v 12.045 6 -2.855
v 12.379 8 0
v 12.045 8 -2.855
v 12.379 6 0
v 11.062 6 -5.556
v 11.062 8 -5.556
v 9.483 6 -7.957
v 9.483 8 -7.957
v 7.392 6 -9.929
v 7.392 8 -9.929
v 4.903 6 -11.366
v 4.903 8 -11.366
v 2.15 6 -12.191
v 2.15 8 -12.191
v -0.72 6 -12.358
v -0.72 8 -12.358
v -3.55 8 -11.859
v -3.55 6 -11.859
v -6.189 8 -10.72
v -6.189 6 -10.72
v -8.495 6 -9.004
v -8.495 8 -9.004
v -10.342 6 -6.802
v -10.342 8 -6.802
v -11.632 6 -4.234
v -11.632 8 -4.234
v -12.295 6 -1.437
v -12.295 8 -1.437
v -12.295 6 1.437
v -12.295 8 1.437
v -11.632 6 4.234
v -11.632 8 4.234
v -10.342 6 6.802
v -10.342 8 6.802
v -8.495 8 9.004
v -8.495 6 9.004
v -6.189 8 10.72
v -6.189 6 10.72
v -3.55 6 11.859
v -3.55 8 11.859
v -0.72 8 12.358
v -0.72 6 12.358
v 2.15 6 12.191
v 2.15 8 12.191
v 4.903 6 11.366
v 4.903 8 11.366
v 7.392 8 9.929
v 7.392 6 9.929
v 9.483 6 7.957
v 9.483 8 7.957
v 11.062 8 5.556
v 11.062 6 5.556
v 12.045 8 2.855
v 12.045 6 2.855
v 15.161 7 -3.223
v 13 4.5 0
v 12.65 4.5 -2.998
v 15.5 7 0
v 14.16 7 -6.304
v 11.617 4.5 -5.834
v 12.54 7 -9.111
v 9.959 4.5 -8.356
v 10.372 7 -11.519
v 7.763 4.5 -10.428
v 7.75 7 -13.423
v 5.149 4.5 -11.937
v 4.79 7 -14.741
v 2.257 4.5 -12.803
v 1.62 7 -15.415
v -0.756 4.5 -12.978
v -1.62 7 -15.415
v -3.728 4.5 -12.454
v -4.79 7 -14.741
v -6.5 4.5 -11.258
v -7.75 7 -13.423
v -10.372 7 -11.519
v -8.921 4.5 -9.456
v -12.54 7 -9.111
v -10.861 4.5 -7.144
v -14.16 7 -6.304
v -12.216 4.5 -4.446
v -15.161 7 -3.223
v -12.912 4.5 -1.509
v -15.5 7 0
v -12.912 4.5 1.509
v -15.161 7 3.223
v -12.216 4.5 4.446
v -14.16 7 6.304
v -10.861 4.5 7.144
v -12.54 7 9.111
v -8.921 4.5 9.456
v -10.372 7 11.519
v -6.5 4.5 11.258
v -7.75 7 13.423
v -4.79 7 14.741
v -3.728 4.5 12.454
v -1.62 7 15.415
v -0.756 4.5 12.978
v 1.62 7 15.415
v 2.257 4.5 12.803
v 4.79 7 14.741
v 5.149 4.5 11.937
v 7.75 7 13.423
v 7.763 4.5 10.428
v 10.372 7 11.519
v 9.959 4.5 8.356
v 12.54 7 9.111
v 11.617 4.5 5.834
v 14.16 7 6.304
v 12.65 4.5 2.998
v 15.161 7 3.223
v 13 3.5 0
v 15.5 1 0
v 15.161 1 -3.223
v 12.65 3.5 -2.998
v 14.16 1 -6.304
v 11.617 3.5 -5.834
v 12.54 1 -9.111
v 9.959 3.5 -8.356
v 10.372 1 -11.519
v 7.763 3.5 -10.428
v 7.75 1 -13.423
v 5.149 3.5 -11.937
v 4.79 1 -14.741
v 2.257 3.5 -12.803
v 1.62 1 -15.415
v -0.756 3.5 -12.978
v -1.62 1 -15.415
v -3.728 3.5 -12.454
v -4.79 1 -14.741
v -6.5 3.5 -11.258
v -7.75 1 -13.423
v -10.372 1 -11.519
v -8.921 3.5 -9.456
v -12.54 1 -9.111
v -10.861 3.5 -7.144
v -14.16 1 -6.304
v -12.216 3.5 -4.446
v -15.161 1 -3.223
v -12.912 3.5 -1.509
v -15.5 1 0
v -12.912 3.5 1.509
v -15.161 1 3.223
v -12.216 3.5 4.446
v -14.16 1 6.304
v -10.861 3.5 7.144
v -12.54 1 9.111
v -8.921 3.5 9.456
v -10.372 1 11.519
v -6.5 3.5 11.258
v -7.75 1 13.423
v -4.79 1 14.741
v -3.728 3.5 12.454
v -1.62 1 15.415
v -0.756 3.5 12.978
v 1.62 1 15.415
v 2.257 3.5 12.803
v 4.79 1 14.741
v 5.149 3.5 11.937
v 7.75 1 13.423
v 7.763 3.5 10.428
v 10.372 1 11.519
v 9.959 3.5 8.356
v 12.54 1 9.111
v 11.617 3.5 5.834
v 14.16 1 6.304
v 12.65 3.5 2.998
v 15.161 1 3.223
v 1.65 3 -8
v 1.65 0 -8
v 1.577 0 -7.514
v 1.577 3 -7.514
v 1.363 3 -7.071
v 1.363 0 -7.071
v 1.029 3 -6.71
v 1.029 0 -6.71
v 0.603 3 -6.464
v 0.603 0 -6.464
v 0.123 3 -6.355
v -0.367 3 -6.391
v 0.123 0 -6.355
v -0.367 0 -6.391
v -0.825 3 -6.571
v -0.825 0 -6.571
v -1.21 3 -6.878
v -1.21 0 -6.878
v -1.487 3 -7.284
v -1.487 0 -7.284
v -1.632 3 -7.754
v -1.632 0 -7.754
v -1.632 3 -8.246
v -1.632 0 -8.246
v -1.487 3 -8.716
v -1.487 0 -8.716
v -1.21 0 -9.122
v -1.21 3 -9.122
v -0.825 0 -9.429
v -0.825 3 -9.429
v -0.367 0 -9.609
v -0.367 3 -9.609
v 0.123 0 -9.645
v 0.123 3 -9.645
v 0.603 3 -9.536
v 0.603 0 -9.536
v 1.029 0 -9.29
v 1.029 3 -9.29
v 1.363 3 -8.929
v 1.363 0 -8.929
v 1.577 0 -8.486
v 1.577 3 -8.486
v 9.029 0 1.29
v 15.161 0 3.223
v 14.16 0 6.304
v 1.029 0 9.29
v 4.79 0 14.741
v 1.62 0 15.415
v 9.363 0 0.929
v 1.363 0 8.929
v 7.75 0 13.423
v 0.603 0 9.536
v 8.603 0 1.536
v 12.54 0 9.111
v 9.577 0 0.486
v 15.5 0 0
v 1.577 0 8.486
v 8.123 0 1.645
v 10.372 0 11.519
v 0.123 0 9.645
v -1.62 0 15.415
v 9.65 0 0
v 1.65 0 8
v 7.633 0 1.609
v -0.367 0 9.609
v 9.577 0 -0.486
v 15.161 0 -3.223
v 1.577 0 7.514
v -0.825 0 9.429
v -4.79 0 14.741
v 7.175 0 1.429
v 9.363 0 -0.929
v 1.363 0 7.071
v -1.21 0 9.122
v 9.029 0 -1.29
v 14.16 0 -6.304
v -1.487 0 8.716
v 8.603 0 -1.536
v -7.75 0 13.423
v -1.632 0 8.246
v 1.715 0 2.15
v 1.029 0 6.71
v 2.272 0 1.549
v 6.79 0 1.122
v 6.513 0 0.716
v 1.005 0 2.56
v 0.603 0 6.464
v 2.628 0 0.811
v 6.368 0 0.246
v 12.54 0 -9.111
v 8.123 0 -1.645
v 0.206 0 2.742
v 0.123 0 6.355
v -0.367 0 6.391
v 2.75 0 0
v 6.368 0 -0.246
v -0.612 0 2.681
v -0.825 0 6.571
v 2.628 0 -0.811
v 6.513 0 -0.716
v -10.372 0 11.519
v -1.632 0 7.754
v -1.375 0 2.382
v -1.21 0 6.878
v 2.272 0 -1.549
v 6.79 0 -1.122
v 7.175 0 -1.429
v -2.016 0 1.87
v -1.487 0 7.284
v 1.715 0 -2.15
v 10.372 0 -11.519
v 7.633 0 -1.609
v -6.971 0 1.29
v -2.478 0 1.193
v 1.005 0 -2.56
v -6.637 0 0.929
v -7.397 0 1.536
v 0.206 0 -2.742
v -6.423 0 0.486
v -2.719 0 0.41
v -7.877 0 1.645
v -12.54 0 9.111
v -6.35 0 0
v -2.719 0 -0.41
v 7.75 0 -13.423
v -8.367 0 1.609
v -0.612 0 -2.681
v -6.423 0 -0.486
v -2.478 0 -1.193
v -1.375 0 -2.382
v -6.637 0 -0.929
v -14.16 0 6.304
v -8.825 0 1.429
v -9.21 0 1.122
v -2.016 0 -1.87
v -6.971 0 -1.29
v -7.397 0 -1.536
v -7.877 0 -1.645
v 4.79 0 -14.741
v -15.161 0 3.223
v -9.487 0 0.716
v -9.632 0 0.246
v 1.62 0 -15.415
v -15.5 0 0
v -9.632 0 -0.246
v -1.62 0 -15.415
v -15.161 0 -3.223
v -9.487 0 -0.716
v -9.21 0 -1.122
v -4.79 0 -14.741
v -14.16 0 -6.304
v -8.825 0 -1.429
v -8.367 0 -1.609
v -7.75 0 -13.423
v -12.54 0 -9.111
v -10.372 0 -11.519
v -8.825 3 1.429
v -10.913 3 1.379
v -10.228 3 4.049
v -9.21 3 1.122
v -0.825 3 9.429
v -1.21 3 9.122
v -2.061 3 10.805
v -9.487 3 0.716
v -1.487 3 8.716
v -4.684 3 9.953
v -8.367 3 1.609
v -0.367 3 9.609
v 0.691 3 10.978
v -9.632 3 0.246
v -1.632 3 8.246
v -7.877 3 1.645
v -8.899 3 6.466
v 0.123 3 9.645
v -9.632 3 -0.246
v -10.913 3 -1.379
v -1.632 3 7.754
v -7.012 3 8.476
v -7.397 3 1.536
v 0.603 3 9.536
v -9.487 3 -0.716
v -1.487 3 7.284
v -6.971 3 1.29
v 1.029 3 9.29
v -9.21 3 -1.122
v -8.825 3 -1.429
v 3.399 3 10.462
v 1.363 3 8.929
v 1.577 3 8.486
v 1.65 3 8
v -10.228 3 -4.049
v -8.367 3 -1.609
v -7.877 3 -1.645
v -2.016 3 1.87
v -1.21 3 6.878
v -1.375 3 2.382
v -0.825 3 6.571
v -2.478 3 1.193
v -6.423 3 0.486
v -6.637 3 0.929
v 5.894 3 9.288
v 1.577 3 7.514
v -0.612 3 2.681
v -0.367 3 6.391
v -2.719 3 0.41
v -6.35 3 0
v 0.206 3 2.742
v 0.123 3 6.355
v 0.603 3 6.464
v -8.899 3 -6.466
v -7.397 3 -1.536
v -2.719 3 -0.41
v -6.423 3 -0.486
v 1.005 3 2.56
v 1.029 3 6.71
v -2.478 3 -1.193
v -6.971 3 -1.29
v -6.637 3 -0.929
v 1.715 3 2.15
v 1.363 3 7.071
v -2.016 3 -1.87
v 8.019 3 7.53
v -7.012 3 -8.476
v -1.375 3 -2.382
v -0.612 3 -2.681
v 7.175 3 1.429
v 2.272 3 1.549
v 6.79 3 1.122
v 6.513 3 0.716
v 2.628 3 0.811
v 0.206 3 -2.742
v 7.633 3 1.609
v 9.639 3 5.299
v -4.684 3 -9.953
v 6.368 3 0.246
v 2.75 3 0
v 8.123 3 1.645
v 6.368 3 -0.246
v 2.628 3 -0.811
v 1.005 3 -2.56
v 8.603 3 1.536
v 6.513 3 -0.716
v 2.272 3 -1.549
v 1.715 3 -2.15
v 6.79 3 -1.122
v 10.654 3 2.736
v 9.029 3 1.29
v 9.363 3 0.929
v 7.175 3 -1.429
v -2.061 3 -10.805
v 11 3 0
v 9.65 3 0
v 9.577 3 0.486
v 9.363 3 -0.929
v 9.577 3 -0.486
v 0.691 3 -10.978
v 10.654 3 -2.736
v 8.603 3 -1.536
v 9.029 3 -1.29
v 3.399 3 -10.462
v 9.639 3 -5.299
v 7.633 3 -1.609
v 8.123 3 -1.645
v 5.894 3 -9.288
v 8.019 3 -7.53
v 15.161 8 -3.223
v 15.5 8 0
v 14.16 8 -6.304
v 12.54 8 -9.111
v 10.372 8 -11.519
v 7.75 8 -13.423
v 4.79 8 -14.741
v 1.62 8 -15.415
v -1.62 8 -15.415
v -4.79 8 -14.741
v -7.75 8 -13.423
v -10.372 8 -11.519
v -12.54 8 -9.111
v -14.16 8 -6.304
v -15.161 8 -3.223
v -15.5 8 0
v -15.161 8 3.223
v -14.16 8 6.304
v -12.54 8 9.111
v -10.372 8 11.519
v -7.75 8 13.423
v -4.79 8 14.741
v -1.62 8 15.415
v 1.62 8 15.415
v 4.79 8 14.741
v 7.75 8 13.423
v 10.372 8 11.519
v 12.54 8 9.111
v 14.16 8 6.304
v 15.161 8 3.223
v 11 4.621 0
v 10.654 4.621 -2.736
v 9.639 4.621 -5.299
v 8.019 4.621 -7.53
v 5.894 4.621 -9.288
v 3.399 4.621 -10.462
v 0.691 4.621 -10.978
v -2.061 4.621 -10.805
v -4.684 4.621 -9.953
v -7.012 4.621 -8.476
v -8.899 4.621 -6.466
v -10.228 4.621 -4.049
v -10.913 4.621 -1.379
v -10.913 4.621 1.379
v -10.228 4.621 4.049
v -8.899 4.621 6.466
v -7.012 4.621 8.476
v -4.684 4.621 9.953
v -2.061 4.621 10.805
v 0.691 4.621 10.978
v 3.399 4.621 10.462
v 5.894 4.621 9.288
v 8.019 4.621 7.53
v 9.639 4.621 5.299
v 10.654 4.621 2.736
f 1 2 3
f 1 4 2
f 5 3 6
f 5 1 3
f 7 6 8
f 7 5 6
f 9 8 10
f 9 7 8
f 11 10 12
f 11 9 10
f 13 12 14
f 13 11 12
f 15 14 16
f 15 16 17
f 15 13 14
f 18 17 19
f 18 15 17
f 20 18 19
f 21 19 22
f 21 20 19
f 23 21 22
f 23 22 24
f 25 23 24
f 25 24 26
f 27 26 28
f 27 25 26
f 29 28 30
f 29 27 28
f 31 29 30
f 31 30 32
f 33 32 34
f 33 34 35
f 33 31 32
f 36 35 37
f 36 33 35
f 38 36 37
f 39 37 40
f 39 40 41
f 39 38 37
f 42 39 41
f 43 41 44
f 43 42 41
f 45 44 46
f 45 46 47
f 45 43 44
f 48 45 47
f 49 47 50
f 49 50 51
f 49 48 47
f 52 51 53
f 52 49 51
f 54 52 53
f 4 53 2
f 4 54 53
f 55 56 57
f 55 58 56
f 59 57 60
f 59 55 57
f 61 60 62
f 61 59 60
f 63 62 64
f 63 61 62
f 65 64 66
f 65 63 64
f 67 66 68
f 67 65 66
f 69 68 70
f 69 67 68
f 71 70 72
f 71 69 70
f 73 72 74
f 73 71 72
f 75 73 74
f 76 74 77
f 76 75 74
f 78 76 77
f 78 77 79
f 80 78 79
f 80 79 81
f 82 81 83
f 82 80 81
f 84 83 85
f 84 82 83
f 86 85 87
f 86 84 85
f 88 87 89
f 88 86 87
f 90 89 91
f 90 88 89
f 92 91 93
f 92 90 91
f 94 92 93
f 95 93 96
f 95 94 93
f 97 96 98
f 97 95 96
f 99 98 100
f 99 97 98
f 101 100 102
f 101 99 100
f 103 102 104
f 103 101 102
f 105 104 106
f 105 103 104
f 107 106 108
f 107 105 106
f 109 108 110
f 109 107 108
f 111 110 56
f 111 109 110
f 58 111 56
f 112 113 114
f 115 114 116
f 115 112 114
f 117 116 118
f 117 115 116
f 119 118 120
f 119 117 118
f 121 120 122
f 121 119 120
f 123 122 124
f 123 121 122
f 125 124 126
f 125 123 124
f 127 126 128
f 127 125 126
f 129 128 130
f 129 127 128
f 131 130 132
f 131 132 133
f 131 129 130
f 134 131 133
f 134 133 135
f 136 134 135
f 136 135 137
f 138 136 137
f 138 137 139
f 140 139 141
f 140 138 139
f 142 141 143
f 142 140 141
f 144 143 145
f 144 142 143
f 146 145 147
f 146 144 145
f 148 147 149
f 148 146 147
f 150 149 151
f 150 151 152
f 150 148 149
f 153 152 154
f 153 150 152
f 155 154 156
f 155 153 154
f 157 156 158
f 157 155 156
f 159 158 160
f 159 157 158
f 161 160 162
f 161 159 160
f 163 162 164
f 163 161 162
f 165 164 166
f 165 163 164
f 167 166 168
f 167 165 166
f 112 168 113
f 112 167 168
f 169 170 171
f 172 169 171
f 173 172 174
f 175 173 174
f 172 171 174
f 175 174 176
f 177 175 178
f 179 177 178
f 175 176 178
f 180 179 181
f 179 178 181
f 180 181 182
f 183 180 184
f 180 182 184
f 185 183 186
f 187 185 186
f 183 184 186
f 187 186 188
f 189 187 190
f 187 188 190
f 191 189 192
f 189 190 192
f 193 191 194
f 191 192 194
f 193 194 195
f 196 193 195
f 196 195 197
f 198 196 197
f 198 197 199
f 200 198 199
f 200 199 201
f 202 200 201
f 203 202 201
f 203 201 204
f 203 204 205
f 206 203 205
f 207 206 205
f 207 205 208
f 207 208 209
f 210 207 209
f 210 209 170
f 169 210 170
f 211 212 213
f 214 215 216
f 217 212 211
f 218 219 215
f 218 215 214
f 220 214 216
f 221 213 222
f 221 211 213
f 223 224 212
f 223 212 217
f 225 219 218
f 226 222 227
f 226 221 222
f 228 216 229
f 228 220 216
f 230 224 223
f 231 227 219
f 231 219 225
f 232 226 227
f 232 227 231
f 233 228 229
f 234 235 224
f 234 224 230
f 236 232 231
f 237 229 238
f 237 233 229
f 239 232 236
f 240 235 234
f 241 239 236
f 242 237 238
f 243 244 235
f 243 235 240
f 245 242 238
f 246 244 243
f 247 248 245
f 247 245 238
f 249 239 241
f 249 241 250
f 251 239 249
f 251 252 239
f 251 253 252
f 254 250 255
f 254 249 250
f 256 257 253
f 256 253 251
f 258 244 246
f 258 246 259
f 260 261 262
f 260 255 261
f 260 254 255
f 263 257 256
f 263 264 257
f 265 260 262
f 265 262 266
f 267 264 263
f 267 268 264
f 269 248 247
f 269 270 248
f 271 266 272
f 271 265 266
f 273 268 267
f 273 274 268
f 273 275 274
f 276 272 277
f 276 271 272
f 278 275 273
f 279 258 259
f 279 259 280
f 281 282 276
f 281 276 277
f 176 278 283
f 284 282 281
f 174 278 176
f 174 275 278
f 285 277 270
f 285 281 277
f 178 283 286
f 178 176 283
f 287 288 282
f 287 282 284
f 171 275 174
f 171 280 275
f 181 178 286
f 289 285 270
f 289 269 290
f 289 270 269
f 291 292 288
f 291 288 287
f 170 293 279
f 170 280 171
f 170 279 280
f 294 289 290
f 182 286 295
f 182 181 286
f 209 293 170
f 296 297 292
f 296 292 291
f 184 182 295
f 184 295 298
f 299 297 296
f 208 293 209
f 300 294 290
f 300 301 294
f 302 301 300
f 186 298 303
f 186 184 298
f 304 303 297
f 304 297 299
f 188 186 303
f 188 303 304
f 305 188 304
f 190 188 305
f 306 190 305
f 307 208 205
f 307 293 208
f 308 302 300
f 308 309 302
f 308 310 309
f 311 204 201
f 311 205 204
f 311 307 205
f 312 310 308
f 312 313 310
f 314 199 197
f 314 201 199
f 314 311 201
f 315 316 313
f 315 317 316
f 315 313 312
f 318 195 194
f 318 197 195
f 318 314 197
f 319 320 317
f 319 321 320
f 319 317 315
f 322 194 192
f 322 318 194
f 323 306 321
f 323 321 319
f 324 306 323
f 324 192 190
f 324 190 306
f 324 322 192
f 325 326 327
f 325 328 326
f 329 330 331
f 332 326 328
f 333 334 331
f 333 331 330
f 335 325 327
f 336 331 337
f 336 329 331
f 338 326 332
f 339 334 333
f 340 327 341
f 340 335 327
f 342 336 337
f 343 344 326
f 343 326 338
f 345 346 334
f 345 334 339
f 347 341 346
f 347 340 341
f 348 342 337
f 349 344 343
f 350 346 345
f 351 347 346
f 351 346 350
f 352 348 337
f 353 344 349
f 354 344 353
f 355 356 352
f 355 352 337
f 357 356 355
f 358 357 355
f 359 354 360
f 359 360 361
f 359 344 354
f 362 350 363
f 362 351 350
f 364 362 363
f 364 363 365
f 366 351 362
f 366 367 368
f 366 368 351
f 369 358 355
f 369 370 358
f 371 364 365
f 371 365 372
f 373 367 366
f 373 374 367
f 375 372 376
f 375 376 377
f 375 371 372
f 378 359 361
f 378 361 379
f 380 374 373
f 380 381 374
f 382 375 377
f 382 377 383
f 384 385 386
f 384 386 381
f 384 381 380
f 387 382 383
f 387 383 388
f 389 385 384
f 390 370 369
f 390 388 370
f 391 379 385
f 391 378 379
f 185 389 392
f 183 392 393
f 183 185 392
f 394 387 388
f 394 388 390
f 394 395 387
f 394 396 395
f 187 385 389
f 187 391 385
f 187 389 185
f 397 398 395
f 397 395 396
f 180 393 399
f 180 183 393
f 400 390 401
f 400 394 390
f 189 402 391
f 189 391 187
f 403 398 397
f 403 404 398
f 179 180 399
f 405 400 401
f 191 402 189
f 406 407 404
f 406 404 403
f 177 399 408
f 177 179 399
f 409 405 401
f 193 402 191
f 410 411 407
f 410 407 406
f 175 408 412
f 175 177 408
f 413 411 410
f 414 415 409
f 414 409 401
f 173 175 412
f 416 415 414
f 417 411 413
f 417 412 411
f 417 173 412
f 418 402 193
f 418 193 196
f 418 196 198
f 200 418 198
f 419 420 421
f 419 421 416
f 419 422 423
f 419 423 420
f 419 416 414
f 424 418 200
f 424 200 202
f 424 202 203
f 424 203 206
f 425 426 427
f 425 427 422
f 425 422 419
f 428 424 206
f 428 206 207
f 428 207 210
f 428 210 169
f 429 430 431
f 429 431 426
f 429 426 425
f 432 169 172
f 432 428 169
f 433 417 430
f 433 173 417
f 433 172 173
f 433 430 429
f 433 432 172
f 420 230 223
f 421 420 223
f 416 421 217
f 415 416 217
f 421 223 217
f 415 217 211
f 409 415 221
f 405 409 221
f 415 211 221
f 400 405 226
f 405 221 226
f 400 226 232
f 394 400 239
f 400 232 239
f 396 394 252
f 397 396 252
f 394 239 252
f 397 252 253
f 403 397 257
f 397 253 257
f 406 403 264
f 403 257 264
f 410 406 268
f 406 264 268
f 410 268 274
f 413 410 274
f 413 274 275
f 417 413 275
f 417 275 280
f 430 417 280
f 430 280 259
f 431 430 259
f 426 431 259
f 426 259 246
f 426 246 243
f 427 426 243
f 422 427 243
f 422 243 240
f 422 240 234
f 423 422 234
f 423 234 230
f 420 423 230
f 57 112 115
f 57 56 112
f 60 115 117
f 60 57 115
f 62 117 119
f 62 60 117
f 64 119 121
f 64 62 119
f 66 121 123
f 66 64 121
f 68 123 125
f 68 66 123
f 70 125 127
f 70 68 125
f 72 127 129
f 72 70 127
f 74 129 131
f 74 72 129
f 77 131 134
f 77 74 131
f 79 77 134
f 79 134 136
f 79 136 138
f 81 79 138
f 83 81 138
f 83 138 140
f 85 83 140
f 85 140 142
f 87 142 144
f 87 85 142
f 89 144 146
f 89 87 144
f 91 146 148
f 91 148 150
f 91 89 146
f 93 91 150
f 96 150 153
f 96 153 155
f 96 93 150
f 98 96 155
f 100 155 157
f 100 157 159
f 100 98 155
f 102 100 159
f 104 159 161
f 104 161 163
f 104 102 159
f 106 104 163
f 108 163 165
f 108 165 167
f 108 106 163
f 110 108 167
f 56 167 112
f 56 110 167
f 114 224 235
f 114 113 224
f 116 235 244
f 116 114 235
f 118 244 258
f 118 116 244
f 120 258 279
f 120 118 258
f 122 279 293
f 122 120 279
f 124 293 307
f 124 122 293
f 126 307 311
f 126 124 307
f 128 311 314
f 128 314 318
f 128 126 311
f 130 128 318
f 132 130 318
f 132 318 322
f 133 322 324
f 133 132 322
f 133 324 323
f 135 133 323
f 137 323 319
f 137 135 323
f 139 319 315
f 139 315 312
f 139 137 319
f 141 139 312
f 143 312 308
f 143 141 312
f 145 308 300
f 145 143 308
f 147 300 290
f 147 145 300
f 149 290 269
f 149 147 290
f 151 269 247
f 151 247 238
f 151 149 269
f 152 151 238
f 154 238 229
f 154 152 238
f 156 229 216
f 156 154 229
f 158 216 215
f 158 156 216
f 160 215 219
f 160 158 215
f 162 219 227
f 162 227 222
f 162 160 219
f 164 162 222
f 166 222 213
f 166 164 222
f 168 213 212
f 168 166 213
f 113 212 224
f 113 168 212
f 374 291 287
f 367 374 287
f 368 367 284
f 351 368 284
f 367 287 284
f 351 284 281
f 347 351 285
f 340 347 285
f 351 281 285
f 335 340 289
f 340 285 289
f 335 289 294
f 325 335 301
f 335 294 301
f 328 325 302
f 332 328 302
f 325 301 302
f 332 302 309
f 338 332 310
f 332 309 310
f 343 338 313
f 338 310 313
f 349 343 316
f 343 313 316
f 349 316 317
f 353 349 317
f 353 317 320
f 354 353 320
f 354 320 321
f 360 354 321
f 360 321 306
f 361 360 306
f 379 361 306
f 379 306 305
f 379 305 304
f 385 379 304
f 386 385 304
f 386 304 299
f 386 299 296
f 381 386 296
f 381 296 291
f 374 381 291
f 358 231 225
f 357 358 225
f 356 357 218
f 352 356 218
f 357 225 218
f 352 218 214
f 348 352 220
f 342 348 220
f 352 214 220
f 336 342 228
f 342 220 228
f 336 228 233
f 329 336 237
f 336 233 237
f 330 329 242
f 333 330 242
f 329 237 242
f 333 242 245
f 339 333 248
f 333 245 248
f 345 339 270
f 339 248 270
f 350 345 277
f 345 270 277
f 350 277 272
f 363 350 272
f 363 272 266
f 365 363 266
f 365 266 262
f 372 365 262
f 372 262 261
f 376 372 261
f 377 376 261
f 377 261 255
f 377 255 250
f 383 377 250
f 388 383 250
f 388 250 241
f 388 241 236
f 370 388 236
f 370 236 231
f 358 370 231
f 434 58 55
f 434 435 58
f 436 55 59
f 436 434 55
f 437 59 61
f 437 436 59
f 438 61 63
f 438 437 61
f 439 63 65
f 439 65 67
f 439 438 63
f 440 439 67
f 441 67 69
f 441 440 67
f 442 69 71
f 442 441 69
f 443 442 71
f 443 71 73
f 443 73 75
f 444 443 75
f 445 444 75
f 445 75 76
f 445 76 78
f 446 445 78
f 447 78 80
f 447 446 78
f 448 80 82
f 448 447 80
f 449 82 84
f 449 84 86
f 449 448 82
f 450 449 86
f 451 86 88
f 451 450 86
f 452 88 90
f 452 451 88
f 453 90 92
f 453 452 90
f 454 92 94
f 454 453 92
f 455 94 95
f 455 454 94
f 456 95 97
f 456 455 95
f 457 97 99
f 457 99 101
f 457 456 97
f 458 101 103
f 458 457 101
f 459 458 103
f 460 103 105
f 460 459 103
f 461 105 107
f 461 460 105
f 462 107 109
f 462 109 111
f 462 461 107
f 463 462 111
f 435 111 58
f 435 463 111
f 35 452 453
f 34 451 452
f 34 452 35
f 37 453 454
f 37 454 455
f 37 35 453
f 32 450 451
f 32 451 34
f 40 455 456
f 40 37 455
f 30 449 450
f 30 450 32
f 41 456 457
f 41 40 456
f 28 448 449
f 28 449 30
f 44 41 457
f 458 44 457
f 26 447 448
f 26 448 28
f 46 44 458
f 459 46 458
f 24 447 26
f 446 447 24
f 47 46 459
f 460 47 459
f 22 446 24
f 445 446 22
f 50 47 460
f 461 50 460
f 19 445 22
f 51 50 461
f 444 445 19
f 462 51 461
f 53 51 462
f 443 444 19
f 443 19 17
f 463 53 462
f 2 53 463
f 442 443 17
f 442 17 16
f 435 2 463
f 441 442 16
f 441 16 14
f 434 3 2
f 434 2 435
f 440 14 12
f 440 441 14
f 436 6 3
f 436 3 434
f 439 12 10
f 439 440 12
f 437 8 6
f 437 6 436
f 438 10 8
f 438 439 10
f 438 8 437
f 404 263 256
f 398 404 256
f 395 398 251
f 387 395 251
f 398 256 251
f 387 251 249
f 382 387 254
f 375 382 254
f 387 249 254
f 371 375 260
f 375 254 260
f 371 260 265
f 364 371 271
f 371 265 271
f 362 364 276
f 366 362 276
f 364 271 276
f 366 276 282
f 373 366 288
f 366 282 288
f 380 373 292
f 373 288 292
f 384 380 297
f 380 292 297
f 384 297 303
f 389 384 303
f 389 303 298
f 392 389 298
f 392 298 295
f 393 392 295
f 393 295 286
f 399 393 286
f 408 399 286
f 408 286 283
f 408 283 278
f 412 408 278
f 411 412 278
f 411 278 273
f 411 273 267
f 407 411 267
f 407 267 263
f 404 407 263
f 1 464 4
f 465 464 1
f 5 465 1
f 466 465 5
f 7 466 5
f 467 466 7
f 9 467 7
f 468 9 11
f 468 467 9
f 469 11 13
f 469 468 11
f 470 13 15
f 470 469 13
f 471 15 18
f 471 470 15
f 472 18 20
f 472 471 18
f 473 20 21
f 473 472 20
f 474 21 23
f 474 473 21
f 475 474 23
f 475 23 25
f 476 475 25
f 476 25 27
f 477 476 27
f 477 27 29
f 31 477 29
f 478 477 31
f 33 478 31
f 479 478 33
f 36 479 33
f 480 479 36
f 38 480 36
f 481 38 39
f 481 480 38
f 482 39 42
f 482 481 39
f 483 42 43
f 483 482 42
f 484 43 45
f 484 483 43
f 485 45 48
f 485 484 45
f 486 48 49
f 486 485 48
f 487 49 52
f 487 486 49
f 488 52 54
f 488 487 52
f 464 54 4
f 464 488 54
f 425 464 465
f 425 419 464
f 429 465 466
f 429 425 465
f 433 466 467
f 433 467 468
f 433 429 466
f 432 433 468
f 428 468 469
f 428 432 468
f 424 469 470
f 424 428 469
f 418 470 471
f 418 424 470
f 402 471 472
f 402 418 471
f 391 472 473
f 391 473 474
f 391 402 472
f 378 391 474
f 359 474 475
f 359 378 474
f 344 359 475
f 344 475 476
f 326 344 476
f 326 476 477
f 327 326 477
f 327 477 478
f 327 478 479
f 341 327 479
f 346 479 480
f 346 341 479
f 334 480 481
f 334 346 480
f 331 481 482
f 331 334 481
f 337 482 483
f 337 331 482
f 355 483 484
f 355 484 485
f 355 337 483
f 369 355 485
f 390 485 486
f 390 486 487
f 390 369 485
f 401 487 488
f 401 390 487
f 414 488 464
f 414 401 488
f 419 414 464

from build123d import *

# Parameters (mm, degrees)
SKETCH_3_R          = 2.75
SKETCH_3_R_2        = 1.65
CUT_EXTRUDE_1_DEPTH = 24.334523779


with BuildPart() as part:
    # 草图2 → 旋转1 (revolve)
    with BuildSketch(Plane.XY):
        Polygon((0, 0), (-15.5, 0), (-15.5, 1), (-13, 3.5), (-13, 4.5), (-15.5, 7), (-15.5, 8), (-12.378679656, 8), (-12.378679656, 6), (-11, 4.621320344), (-11, 3), (0, 3), (0, 1.5), align=None)
    revolve(axis=Axis((0, 0, 0), (0, 1, 0)))

    # 草图3 → 切除-拉伸1 (cut, through all)
    with BuildSketch(Plane.XZ):
        Circle(SKETCH_3_R)
        with Locations((0, 8)):
            Circle(SKETCH_3_R_2)
        with Locations((8, 0)):
            Circle(SKETCH_3_R_2)
        with Locations((0, -8)):
            Circle(SKETCH_3_R_2)
        with Locations((-8, 0)):
            Circle(SKETCH_3_R_2)
    extrude(amount=-CUT_EXTRUDE_1_DEPTH, mode=Mode.SUBTRACT)


solid = part.part
